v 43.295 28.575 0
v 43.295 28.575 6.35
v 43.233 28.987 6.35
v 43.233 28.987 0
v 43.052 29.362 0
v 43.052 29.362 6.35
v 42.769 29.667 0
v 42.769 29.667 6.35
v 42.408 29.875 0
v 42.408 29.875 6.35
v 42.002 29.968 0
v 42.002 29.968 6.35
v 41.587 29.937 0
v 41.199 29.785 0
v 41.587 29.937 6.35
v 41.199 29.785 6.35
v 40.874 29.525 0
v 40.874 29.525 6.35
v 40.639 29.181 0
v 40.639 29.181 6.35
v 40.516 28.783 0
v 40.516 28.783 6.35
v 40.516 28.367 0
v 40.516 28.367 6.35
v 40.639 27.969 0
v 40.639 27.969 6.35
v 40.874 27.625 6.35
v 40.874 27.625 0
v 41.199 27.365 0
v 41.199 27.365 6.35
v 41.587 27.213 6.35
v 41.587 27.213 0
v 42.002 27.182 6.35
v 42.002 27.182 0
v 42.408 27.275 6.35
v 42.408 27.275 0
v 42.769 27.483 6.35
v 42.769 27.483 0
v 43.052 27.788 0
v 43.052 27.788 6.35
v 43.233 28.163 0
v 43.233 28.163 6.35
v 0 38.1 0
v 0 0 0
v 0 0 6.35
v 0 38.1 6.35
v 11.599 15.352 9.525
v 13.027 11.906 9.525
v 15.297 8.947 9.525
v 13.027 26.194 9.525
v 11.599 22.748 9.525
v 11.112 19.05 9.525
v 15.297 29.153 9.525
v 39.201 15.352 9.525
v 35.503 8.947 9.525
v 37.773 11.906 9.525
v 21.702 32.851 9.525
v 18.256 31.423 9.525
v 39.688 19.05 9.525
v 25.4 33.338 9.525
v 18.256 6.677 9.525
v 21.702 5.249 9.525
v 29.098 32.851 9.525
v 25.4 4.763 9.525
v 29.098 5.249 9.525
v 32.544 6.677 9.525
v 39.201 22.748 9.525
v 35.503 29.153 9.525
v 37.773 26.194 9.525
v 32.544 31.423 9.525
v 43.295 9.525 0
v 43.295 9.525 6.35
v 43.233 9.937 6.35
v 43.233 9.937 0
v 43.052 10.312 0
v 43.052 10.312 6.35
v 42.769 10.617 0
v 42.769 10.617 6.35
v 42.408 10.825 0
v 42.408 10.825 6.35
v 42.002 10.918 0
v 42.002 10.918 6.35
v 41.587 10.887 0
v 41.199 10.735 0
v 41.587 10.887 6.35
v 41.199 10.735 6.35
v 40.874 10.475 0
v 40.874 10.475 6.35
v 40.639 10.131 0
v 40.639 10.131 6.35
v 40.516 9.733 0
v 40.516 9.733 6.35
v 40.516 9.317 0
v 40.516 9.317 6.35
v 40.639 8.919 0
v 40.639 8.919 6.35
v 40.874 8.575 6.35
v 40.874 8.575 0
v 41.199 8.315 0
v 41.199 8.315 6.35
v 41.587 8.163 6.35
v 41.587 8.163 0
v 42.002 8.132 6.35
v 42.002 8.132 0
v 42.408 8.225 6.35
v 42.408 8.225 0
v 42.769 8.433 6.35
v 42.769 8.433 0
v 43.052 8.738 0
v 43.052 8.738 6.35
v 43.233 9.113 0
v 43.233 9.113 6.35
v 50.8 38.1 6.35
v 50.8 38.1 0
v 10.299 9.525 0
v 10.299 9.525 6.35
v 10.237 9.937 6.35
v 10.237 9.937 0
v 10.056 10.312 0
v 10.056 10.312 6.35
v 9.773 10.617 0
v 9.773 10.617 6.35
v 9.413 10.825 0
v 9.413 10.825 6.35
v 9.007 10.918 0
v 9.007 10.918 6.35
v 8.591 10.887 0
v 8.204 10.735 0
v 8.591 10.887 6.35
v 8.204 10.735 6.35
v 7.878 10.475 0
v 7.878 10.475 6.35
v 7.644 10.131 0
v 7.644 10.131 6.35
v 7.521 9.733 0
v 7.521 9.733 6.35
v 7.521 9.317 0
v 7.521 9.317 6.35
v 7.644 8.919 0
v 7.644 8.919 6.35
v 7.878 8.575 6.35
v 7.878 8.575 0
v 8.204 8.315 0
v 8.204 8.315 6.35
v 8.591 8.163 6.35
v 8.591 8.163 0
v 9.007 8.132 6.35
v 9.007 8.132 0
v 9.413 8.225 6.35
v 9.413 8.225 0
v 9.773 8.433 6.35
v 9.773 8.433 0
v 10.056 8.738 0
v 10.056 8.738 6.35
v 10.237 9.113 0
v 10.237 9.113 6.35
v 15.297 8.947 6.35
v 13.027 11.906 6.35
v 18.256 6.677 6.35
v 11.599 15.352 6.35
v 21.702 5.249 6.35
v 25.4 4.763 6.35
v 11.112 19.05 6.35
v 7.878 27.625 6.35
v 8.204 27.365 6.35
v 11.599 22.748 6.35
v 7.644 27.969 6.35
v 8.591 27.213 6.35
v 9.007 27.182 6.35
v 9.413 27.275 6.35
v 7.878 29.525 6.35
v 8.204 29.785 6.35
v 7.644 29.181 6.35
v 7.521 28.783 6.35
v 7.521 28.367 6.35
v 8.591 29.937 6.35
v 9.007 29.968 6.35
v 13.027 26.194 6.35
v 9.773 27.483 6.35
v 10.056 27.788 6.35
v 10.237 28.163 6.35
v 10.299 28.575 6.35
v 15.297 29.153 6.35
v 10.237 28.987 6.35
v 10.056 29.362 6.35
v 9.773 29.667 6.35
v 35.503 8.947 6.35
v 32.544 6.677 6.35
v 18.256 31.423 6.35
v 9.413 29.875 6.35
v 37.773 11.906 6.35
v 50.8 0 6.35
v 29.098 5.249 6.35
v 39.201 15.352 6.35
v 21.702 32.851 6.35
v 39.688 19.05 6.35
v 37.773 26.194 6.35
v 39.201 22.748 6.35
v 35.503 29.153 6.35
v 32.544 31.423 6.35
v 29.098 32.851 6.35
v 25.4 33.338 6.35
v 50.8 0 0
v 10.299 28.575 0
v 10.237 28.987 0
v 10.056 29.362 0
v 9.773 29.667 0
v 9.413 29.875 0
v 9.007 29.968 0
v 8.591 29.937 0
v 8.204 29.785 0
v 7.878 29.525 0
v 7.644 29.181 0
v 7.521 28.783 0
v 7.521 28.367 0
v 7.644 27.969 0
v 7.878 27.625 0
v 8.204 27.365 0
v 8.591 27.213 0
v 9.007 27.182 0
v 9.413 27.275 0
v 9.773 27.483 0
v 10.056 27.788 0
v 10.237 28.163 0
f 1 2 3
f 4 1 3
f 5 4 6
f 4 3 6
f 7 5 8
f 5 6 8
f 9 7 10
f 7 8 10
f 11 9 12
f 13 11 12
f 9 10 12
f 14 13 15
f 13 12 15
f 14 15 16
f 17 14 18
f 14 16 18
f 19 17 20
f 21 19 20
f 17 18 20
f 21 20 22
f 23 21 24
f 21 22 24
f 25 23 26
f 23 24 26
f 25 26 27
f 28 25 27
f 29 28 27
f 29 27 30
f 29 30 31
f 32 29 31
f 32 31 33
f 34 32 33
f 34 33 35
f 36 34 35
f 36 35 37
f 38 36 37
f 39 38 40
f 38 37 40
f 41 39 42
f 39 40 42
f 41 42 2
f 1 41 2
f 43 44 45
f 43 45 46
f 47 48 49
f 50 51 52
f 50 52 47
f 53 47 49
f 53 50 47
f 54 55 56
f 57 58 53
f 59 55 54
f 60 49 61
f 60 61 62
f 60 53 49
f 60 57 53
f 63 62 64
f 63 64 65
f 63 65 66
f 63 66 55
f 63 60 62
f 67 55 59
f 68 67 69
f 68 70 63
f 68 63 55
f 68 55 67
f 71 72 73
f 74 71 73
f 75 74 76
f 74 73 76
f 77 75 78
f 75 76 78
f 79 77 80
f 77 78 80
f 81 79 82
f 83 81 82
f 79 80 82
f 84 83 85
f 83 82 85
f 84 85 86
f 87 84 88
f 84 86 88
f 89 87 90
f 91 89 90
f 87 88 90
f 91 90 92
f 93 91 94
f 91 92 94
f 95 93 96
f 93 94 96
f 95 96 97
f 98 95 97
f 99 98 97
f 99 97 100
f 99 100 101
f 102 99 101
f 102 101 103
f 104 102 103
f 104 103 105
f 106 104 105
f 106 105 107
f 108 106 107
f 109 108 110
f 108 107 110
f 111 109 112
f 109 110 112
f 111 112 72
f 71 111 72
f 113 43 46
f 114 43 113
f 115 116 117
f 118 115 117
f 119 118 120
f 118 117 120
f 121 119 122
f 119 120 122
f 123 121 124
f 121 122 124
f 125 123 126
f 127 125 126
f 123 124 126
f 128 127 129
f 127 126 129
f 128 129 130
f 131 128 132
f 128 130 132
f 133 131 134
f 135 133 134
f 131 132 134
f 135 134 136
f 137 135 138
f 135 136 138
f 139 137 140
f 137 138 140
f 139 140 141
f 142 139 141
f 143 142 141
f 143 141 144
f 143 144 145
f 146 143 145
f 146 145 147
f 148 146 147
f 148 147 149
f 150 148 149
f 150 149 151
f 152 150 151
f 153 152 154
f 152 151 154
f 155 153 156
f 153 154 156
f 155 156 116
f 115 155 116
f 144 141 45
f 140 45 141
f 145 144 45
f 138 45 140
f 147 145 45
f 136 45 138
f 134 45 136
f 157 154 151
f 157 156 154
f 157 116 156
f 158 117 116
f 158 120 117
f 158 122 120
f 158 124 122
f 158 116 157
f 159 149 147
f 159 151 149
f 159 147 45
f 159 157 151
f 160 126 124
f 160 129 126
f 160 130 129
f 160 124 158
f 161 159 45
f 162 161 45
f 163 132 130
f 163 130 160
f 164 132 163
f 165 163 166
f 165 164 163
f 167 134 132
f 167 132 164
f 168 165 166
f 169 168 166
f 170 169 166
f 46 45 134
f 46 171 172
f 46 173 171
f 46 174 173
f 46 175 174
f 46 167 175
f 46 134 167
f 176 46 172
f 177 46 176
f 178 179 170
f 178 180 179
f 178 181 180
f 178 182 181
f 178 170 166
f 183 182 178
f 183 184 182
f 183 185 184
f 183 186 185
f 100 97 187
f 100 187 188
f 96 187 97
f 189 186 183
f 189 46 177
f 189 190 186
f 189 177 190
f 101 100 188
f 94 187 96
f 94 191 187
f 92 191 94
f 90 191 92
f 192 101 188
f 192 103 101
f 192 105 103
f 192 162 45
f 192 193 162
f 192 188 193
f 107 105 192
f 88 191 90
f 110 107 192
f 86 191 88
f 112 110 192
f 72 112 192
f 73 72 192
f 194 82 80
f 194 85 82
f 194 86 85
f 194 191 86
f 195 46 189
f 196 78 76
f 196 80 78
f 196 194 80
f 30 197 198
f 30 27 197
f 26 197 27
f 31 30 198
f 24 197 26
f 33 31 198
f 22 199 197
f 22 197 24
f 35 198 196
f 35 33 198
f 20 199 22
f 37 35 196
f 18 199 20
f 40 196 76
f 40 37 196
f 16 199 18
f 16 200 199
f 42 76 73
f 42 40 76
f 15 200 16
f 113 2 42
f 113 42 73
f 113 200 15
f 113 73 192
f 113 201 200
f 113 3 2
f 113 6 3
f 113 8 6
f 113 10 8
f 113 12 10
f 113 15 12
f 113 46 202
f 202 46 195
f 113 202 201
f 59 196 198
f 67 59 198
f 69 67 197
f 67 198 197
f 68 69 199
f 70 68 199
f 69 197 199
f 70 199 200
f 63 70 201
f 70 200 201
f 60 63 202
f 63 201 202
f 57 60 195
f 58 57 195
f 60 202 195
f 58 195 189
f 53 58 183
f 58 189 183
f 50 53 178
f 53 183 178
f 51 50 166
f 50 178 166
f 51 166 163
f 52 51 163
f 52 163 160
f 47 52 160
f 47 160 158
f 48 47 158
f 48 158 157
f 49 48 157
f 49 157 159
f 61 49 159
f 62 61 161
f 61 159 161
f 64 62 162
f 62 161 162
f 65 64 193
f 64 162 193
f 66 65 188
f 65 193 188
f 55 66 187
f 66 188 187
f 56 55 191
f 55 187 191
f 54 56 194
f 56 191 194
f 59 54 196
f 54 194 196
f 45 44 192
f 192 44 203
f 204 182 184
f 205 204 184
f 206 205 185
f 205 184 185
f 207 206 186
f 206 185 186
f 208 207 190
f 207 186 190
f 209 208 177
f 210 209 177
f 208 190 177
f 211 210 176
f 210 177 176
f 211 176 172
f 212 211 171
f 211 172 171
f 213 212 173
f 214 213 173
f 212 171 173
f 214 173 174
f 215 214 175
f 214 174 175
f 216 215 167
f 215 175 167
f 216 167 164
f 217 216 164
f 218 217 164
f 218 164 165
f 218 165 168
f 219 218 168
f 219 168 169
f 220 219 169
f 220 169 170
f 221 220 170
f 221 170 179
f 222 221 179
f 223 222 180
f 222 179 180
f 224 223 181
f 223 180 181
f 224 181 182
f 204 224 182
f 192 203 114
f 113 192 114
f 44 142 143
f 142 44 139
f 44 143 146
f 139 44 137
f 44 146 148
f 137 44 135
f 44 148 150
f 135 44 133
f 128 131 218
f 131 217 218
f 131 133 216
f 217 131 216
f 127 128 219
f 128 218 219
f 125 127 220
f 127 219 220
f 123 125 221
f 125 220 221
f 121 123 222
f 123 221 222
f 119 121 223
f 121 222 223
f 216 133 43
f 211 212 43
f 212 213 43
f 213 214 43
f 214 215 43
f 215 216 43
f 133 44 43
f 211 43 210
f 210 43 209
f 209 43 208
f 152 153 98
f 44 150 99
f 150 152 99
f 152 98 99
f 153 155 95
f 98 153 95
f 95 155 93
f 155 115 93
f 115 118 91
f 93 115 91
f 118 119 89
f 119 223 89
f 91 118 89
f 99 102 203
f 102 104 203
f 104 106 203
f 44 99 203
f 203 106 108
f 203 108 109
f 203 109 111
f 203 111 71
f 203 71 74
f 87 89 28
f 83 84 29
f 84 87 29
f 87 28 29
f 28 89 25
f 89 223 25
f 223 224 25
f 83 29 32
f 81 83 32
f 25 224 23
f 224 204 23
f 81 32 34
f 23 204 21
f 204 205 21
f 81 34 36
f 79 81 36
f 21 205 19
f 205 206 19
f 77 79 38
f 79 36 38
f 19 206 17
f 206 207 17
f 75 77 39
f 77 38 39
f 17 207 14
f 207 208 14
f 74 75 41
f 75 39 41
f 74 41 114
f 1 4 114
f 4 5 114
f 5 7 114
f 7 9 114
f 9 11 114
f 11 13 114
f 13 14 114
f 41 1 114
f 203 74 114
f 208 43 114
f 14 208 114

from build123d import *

# Parameters (mm, degrees)
F0_W     = 50.8
F0_H     = 38.1
F1_DEPTH = 6.35
F2_R     = 14.2875
F3_DEPTH = 3.175
F4_R     = 1.397
F5_DEPTH = 6.35


with BuildPart() as f1:
    # F0 (on Top) → F1 (new body)
    with BuildSketch(Plane.XY):
        with Locations((25.4, 19.05)):
            Rectangle(F0_W, F0_H)
    extrude(amount=F1_DEPTH)

    # F2 (on face) → F3 (join)
    with BuildSketch(Plane.XY.offset(6.35)):
        with Locations((25.4, 19.05)):
            Circle(F2_R)
    extrude(amount=F3_DEPTH)

    # F4 (on face) → F5 (cut, through all)
    with BuildSketch(Plane.XY.offset(6.35)):
        with Locations((8.902216, 28.575)):
            Circle(F4_R)
        with Locations((41.897784, 28.575)):
            Circle(F4_R)
        with Locations((41.897784, 9.525)):
            Circle(F4_R)
        with Locations((8.902216, 9.525)):
            Circle(F4_R)
    extrude(amount=-F5_DEPTH, mode=Mode.SUBTRACT)


solid = f1.part
